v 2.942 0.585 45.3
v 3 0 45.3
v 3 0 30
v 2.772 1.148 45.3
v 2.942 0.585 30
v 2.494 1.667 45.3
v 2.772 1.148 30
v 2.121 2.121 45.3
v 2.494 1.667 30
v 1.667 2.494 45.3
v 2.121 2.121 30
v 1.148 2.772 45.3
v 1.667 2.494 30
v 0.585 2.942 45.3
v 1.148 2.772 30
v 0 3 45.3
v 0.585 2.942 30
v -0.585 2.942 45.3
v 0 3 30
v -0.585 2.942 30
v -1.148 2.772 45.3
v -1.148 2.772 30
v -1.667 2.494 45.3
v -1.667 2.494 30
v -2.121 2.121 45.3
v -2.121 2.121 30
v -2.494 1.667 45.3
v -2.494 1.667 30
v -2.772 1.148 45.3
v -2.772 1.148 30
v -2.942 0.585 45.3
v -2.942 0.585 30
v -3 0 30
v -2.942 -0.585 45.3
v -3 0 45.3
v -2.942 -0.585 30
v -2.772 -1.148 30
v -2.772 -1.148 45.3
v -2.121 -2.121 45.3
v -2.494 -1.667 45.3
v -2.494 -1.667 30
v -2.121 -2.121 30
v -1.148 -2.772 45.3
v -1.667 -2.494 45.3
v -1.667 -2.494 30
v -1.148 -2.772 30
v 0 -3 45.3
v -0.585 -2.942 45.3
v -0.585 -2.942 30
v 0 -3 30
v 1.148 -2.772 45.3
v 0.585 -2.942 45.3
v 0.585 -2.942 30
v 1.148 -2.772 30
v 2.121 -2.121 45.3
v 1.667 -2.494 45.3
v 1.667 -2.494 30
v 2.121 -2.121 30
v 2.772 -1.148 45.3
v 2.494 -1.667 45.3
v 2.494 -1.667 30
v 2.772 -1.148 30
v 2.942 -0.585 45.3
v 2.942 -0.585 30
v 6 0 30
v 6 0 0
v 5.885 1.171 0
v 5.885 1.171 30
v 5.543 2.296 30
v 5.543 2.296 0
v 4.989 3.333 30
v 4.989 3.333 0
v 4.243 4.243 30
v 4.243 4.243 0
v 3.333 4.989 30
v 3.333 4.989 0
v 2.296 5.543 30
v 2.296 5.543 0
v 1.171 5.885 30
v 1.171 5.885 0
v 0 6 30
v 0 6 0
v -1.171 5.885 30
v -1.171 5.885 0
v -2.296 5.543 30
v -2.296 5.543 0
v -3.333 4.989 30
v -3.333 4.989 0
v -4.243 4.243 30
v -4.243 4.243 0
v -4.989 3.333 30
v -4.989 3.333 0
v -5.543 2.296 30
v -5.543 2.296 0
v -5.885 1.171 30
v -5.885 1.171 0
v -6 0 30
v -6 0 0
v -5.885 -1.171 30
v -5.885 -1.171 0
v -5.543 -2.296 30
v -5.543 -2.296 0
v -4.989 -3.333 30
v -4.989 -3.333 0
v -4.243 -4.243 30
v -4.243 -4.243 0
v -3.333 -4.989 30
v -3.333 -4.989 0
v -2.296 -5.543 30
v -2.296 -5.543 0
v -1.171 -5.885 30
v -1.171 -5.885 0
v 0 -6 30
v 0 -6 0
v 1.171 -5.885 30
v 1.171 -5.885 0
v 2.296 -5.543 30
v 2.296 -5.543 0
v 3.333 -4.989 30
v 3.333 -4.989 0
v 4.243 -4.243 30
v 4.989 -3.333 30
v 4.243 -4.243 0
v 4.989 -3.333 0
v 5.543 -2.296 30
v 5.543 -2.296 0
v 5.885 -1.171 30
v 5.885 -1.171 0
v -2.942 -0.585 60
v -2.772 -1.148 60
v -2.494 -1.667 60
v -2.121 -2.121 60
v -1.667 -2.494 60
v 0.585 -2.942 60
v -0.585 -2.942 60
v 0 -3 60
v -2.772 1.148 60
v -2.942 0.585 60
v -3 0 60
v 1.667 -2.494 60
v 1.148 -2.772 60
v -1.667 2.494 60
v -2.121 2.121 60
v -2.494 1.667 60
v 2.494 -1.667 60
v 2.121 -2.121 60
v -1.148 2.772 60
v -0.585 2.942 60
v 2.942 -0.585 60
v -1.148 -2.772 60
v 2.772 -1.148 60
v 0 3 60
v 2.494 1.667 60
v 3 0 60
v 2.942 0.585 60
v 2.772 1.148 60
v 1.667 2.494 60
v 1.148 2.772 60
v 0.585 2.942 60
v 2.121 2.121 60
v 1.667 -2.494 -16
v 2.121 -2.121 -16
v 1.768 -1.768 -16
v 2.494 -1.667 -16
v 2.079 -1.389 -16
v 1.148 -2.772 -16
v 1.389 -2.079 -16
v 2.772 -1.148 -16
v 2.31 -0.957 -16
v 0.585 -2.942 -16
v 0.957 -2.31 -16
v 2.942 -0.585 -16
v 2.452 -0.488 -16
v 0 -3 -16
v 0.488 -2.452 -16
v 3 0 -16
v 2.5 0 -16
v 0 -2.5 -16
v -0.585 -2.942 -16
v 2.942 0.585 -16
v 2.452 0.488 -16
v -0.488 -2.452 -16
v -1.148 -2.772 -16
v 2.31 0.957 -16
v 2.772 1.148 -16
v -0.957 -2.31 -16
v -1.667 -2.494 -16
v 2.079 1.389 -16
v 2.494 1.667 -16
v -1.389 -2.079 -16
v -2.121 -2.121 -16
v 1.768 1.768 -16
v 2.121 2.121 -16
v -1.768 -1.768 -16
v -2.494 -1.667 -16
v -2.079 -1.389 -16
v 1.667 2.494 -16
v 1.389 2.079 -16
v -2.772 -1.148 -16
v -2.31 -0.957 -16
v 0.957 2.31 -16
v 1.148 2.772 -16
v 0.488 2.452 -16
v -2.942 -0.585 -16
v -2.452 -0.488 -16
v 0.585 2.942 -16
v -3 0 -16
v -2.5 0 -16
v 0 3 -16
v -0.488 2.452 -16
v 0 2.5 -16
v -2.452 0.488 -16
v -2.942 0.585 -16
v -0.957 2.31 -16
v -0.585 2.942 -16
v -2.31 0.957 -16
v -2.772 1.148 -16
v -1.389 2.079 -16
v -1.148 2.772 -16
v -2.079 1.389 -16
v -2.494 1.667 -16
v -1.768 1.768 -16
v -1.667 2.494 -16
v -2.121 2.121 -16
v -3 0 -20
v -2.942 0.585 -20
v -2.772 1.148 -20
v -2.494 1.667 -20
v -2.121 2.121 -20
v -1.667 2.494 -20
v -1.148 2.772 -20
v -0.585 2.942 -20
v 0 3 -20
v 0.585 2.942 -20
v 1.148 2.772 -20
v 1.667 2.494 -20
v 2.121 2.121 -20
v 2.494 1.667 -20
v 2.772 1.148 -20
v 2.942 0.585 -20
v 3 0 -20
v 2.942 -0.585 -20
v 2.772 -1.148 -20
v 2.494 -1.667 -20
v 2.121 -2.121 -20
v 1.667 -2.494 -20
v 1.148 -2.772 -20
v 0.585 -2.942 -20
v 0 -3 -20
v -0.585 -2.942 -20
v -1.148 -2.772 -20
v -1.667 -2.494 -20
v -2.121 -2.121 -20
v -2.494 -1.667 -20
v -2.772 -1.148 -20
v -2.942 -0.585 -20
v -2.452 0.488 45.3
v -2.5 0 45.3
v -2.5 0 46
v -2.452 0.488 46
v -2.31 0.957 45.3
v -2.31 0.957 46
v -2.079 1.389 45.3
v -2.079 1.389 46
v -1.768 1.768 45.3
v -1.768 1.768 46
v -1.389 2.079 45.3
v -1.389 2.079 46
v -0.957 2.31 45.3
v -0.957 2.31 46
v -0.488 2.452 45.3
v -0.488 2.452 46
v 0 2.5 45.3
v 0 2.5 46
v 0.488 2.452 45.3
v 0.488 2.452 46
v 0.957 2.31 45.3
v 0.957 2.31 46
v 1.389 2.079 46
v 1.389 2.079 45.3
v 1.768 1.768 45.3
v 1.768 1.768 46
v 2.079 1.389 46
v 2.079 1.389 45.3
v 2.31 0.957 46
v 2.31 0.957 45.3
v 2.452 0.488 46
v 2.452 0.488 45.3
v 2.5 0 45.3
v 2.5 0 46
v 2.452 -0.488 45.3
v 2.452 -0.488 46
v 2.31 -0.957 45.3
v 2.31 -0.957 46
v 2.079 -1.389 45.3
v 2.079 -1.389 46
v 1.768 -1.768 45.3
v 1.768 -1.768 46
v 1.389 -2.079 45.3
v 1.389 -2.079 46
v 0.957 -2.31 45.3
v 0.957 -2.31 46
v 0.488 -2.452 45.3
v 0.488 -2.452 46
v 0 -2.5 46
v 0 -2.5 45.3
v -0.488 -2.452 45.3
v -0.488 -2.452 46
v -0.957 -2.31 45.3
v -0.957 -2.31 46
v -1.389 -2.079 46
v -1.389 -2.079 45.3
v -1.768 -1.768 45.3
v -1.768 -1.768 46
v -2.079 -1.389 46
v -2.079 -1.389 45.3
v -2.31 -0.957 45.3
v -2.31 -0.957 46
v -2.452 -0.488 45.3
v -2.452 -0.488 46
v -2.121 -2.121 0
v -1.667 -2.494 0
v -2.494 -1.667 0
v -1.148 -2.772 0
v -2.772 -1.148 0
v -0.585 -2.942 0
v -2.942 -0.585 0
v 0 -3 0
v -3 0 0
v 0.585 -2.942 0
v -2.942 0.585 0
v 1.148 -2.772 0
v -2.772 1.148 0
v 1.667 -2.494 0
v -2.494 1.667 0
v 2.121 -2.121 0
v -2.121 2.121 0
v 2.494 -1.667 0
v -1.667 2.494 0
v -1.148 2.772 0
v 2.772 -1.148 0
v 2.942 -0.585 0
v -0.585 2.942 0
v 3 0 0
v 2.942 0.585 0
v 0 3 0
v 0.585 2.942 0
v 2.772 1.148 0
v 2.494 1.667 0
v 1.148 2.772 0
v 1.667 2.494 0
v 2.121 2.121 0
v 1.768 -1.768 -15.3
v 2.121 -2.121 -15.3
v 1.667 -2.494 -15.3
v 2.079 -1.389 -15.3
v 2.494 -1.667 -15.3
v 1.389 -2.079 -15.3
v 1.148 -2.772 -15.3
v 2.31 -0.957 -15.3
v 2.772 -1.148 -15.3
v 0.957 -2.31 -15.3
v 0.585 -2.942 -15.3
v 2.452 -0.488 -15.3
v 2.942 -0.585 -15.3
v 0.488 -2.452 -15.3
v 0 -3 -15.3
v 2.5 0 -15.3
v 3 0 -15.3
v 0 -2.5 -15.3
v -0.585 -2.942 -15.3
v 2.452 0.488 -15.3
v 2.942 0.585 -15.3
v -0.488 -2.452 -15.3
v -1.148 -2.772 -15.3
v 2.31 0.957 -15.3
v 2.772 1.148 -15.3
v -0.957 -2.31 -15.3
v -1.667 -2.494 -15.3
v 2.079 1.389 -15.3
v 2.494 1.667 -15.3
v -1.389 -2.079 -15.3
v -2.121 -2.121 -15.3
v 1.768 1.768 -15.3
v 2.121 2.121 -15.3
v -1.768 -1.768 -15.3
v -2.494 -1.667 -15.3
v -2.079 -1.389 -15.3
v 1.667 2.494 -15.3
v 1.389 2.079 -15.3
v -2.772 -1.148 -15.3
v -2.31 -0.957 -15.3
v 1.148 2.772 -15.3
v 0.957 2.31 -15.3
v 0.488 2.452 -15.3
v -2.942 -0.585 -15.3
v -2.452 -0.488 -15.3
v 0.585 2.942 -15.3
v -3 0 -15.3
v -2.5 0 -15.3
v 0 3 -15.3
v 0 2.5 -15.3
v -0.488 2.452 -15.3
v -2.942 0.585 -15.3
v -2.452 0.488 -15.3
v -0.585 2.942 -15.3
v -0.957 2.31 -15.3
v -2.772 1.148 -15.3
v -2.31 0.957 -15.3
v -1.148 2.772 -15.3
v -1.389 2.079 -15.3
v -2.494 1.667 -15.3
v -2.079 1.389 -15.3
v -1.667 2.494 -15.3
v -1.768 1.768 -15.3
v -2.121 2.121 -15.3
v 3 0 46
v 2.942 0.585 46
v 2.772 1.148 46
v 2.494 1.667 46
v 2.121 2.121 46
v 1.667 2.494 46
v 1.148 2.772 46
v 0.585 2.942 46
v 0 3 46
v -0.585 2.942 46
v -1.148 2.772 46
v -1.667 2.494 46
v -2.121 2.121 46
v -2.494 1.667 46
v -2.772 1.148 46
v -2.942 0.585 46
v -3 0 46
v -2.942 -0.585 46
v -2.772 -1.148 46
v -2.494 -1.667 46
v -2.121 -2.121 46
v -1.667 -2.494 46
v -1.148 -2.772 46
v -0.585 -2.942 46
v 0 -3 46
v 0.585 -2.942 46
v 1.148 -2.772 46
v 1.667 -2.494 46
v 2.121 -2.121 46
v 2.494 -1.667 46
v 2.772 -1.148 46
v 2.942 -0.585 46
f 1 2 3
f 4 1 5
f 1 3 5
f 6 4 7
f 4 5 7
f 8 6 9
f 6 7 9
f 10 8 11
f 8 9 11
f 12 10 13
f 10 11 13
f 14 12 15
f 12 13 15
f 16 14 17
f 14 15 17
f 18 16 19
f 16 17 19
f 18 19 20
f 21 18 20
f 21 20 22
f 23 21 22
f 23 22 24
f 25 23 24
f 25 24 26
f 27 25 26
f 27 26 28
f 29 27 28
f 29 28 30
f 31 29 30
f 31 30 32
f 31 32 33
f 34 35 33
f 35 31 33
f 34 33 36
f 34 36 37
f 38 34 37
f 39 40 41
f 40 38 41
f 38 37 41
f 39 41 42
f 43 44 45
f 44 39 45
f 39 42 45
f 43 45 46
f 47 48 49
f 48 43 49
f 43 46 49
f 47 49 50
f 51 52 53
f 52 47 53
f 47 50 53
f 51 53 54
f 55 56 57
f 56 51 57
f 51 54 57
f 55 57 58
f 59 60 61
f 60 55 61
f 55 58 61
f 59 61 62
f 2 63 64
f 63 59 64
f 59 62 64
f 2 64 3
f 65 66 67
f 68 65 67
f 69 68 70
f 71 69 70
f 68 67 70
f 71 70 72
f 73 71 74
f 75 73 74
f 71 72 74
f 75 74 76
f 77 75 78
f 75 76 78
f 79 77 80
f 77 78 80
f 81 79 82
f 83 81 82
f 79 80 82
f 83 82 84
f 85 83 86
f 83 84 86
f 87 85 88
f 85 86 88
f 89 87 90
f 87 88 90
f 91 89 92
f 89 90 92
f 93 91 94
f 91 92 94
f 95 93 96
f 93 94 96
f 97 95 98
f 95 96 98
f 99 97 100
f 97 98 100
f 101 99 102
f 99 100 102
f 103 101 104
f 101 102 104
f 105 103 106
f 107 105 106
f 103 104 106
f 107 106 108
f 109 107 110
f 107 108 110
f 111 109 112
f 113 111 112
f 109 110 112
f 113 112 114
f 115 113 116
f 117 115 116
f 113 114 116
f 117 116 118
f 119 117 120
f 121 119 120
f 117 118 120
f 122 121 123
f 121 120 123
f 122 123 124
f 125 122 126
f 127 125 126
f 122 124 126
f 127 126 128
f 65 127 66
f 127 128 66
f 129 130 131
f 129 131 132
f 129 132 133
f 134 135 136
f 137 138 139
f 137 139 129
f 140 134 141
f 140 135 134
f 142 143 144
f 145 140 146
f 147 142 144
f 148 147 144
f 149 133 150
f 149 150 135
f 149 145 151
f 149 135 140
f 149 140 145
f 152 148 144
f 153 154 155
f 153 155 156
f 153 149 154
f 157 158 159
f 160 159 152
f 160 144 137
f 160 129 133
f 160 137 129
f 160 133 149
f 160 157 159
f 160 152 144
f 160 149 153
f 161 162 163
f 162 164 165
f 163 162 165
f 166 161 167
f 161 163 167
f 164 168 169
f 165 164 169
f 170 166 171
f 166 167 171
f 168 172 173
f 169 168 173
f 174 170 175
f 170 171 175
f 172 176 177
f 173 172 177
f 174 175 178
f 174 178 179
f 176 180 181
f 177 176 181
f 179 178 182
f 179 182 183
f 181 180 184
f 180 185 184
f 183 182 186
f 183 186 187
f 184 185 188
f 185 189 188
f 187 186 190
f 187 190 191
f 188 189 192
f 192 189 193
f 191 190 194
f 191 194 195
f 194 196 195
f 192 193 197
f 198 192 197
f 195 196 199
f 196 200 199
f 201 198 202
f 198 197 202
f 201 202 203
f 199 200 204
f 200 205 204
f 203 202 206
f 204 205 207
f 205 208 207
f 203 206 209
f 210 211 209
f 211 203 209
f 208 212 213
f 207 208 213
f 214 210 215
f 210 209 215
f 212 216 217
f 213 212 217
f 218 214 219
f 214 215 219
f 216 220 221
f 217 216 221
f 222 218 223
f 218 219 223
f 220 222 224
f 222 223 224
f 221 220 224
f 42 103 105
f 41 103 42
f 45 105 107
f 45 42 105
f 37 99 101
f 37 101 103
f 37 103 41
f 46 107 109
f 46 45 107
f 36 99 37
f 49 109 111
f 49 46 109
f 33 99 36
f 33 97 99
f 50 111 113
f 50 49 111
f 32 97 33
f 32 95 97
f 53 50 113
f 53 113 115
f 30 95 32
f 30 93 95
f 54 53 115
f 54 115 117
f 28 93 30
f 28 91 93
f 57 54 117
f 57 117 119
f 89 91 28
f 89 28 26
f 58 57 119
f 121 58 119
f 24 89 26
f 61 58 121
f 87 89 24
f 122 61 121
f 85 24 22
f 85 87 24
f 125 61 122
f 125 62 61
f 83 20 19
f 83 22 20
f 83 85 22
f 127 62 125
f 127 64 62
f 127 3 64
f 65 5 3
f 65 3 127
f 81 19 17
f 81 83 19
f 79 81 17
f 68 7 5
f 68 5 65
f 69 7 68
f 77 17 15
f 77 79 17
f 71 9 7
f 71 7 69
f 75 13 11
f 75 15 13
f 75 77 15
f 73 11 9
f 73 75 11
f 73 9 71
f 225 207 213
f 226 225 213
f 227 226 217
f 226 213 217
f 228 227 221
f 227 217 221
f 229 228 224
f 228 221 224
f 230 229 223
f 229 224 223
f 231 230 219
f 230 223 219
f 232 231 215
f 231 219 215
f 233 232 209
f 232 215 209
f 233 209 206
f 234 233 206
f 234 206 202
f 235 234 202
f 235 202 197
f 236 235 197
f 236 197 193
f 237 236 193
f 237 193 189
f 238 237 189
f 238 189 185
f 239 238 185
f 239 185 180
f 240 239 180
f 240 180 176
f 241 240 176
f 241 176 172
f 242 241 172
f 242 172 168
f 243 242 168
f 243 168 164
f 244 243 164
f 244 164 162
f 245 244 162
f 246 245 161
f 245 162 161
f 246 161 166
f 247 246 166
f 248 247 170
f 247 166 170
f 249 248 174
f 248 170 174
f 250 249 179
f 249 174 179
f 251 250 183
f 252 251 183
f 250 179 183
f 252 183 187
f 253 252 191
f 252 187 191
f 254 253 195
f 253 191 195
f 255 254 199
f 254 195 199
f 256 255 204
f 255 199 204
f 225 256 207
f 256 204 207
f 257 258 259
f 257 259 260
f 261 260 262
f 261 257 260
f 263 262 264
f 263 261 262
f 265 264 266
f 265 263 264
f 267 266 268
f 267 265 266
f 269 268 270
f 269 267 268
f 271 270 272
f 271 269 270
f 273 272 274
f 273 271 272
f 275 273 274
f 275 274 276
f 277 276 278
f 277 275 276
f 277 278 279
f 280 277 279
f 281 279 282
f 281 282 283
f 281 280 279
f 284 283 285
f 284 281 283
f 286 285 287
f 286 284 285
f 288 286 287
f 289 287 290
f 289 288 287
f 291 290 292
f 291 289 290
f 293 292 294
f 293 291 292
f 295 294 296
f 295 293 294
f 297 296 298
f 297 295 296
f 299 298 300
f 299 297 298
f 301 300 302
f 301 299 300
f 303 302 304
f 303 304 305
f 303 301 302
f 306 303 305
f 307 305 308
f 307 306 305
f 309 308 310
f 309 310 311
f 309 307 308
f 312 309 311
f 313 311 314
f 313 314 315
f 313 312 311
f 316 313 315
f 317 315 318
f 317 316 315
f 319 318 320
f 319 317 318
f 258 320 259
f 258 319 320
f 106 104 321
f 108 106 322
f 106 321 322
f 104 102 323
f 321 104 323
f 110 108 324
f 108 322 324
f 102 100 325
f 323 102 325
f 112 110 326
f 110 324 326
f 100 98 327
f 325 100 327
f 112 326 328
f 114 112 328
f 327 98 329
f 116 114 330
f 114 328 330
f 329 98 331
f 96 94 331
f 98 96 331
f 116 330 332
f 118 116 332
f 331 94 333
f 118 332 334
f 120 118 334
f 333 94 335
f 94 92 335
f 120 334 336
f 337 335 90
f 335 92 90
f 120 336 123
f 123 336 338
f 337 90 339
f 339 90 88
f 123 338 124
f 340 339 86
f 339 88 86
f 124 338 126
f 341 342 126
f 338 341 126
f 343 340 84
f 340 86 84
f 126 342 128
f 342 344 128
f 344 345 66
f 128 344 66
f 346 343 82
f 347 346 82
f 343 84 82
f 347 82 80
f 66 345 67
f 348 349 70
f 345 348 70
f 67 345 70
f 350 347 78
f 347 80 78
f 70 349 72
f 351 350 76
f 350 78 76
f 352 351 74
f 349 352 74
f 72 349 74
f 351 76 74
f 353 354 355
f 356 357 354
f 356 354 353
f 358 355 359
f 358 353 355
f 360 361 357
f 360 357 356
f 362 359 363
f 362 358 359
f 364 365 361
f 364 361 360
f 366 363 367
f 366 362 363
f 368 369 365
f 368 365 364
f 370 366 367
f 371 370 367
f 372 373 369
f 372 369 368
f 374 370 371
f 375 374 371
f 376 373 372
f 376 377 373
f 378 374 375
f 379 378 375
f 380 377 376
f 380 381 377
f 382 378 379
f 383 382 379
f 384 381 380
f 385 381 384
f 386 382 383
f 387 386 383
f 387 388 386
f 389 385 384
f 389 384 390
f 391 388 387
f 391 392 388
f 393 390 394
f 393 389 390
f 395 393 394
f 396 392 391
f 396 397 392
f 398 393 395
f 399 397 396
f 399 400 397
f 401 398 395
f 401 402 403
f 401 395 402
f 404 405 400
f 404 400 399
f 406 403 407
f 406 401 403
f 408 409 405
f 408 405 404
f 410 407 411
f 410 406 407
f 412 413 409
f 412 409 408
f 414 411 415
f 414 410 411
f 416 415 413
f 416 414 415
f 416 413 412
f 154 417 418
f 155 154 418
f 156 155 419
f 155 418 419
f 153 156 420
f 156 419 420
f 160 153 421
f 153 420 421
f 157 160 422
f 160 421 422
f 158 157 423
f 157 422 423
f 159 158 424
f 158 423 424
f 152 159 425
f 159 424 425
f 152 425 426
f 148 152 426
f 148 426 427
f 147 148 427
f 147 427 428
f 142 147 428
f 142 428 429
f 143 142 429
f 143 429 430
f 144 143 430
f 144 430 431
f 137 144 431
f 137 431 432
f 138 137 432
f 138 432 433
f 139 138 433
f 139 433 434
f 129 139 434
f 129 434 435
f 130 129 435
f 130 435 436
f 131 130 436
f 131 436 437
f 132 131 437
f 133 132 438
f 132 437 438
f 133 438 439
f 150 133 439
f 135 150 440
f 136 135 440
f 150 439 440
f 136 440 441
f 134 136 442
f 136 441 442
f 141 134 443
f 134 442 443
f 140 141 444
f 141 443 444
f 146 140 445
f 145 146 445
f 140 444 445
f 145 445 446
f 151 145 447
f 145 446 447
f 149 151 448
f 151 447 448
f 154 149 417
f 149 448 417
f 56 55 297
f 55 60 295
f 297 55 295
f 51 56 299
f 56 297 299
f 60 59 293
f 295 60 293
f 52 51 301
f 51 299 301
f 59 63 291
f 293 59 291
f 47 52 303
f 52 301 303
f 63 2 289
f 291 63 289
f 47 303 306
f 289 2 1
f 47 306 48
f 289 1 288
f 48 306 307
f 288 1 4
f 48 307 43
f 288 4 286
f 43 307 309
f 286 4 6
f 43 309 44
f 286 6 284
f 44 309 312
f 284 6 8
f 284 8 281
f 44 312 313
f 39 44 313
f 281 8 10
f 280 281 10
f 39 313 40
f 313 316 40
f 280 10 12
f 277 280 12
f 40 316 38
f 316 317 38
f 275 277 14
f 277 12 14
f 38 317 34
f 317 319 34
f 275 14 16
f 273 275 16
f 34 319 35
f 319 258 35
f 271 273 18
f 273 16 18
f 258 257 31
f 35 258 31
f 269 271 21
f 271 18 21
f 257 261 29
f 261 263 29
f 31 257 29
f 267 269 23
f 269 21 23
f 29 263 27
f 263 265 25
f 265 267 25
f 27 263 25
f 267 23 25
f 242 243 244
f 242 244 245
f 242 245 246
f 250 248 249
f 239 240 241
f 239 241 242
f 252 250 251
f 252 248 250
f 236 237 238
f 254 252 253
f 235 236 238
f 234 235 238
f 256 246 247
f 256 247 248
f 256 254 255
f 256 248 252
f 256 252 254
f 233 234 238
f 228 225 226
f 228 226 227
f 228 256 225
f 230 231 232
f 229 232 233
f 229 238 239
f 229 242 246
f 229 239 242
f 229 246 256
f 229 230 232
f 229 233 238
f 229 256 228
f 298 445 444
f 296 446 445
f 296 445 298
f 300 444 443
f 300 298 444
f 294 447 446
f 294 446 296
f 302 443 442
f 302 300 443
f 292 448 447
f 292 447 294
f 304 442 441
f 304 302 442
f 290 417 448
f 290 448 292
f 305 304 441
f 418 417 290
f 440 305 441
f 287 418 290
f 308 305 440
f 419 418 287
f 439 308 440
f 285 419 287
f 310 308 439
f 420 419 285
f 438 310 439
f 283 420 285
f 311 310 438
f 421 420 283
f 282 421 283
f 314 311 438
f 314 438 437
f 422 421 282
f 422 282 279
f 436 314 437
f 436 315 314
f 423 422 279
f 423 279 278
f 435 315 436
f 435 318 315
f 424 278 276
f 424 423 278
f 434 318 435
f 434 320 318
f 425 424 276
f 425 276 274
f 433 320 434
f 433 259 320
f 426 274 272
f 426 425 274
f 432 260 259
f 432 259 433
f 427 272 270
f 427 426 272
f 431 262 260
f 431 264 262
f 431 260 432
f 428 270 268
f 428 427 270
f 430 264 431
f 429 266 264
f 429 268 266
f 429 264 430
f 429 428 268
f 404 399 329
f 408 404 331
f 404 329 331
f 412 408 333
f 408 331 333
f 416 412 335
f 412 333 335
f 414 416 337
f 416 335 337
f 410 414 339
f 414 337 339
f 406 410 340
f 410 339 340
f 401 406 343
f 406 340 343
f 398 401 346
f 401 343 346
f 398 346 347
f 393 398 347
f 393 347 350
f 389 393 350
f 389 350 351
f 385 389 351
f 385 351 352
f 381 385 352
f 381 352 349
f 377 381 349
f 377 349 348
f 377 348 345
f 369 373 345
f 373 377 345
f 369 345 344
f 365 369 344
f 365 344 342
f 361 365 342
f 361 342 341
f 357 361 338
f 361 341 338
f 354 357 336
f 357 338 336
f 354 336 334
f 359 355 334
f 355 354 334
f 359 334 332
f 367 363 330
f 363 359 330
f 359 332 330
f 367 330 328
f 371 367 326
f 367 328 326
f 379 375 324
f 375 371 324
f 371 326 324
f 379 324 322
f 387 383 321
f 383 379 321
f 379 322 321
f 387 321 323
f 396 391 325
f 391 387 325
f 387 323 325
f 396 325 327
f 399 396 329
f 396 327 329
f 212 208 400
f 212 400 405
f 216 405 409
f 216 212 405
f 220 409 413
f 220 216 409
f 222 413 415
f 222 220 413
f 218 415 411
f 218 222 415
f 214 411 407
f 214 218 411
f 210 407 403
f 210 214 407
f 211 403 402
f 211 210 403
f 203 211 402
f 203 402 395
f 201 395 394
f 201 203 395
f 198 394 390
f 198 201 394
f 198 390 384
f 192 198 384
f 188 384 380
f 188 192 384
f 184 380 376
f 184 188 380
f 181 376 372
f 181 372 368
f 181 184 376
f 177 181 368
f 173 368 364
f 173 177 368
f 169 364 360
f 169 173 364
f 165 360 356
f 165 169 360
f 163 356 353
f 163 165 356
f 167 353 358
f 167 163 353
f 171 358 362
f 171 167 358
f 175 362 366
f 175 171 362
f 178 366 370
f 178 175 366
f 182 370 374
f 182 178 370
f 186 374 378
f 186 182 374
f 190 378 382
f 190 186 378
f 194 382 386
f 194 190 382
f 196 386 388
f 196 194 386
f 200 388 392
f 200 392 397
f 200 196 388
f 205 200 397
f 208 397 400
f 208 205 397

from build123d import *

# Parameters (mm, degrees)
SKETCH_1_R          = 6
EXTRUDE_1_DEPTH     = 30
SKETCH_2_R          = 3
EXTRUDE_2_DEPTH     = 20
SKETCH_3_R          = 3
EXTRUDE_3_DEPTH     = 30
SKETCH_4_R          = 6.707362288
SKETCH_4_R_2        = 2.5
CUT_EXTRUDE_1_DEPTH = 0.7
SKETCH_5_R          = 8.291110755
SKETCH_5_R_2        = 2.5
CUT_EXTRUDE_2_DEPTH = 0.7


with BuildPart() as part:
    # 草图1 → 凸台-拉伸1 (new body)
    with BuildSketch(Plane.XY):
        Circle(SKETCH_1_R)
    extrude(amount=EXTRUDE_1_DEPTH)

    # 草图2 → 凸台-拉伸2 (add)
    with BuildSketch(Plane(origin=(0, 0, 0), x_dir=(-1, 0, 0), z_dir=(0, 0, -1))):
        Circle(SKETCH_2_R)
    extrude(amount=EXTRUDE_2_DEPTH)

    # 草图3 → 凸台-拉伸3 (add)
    with BuildSketch(Plane.XY.offset(30)):
        Circle(SKETCH_3_R)
    extrude(amount=EXTRUDE_3_DEPTH)

    # 草图4 → 切除-拉伸1 (cut)
    with BuildSketch(Plane(origin=(0, 0, -16), x_dir=(-1, 0, 0), z_dir=(0, 0, -1))):
        Circle(SKETCH_4_R)
        Circle(SKETCH_4_R_2, mode=Mode.SUBTRACT)
    extrude(amount=-CUT_EXTRUDE_1_DEPTH, mode=Mode.SUBTRACT)

    # 草图5 → 切除-拉伸2 (cut)
    with BuildSketch(Plane(origin=(0, 0, 45.3), x_dir=(-1, 0, 0), z_dir=(0, 0, -1))):
        Circle(SKETCH_5_R)
        Circle(SKETCH_5_R_2, mode=Mode.SUBTRACT)
    extrude(amount=-CUT_EXTRUDE_2_DEPTH, mode=Mode.SUBTRACT)


solid = part.part
